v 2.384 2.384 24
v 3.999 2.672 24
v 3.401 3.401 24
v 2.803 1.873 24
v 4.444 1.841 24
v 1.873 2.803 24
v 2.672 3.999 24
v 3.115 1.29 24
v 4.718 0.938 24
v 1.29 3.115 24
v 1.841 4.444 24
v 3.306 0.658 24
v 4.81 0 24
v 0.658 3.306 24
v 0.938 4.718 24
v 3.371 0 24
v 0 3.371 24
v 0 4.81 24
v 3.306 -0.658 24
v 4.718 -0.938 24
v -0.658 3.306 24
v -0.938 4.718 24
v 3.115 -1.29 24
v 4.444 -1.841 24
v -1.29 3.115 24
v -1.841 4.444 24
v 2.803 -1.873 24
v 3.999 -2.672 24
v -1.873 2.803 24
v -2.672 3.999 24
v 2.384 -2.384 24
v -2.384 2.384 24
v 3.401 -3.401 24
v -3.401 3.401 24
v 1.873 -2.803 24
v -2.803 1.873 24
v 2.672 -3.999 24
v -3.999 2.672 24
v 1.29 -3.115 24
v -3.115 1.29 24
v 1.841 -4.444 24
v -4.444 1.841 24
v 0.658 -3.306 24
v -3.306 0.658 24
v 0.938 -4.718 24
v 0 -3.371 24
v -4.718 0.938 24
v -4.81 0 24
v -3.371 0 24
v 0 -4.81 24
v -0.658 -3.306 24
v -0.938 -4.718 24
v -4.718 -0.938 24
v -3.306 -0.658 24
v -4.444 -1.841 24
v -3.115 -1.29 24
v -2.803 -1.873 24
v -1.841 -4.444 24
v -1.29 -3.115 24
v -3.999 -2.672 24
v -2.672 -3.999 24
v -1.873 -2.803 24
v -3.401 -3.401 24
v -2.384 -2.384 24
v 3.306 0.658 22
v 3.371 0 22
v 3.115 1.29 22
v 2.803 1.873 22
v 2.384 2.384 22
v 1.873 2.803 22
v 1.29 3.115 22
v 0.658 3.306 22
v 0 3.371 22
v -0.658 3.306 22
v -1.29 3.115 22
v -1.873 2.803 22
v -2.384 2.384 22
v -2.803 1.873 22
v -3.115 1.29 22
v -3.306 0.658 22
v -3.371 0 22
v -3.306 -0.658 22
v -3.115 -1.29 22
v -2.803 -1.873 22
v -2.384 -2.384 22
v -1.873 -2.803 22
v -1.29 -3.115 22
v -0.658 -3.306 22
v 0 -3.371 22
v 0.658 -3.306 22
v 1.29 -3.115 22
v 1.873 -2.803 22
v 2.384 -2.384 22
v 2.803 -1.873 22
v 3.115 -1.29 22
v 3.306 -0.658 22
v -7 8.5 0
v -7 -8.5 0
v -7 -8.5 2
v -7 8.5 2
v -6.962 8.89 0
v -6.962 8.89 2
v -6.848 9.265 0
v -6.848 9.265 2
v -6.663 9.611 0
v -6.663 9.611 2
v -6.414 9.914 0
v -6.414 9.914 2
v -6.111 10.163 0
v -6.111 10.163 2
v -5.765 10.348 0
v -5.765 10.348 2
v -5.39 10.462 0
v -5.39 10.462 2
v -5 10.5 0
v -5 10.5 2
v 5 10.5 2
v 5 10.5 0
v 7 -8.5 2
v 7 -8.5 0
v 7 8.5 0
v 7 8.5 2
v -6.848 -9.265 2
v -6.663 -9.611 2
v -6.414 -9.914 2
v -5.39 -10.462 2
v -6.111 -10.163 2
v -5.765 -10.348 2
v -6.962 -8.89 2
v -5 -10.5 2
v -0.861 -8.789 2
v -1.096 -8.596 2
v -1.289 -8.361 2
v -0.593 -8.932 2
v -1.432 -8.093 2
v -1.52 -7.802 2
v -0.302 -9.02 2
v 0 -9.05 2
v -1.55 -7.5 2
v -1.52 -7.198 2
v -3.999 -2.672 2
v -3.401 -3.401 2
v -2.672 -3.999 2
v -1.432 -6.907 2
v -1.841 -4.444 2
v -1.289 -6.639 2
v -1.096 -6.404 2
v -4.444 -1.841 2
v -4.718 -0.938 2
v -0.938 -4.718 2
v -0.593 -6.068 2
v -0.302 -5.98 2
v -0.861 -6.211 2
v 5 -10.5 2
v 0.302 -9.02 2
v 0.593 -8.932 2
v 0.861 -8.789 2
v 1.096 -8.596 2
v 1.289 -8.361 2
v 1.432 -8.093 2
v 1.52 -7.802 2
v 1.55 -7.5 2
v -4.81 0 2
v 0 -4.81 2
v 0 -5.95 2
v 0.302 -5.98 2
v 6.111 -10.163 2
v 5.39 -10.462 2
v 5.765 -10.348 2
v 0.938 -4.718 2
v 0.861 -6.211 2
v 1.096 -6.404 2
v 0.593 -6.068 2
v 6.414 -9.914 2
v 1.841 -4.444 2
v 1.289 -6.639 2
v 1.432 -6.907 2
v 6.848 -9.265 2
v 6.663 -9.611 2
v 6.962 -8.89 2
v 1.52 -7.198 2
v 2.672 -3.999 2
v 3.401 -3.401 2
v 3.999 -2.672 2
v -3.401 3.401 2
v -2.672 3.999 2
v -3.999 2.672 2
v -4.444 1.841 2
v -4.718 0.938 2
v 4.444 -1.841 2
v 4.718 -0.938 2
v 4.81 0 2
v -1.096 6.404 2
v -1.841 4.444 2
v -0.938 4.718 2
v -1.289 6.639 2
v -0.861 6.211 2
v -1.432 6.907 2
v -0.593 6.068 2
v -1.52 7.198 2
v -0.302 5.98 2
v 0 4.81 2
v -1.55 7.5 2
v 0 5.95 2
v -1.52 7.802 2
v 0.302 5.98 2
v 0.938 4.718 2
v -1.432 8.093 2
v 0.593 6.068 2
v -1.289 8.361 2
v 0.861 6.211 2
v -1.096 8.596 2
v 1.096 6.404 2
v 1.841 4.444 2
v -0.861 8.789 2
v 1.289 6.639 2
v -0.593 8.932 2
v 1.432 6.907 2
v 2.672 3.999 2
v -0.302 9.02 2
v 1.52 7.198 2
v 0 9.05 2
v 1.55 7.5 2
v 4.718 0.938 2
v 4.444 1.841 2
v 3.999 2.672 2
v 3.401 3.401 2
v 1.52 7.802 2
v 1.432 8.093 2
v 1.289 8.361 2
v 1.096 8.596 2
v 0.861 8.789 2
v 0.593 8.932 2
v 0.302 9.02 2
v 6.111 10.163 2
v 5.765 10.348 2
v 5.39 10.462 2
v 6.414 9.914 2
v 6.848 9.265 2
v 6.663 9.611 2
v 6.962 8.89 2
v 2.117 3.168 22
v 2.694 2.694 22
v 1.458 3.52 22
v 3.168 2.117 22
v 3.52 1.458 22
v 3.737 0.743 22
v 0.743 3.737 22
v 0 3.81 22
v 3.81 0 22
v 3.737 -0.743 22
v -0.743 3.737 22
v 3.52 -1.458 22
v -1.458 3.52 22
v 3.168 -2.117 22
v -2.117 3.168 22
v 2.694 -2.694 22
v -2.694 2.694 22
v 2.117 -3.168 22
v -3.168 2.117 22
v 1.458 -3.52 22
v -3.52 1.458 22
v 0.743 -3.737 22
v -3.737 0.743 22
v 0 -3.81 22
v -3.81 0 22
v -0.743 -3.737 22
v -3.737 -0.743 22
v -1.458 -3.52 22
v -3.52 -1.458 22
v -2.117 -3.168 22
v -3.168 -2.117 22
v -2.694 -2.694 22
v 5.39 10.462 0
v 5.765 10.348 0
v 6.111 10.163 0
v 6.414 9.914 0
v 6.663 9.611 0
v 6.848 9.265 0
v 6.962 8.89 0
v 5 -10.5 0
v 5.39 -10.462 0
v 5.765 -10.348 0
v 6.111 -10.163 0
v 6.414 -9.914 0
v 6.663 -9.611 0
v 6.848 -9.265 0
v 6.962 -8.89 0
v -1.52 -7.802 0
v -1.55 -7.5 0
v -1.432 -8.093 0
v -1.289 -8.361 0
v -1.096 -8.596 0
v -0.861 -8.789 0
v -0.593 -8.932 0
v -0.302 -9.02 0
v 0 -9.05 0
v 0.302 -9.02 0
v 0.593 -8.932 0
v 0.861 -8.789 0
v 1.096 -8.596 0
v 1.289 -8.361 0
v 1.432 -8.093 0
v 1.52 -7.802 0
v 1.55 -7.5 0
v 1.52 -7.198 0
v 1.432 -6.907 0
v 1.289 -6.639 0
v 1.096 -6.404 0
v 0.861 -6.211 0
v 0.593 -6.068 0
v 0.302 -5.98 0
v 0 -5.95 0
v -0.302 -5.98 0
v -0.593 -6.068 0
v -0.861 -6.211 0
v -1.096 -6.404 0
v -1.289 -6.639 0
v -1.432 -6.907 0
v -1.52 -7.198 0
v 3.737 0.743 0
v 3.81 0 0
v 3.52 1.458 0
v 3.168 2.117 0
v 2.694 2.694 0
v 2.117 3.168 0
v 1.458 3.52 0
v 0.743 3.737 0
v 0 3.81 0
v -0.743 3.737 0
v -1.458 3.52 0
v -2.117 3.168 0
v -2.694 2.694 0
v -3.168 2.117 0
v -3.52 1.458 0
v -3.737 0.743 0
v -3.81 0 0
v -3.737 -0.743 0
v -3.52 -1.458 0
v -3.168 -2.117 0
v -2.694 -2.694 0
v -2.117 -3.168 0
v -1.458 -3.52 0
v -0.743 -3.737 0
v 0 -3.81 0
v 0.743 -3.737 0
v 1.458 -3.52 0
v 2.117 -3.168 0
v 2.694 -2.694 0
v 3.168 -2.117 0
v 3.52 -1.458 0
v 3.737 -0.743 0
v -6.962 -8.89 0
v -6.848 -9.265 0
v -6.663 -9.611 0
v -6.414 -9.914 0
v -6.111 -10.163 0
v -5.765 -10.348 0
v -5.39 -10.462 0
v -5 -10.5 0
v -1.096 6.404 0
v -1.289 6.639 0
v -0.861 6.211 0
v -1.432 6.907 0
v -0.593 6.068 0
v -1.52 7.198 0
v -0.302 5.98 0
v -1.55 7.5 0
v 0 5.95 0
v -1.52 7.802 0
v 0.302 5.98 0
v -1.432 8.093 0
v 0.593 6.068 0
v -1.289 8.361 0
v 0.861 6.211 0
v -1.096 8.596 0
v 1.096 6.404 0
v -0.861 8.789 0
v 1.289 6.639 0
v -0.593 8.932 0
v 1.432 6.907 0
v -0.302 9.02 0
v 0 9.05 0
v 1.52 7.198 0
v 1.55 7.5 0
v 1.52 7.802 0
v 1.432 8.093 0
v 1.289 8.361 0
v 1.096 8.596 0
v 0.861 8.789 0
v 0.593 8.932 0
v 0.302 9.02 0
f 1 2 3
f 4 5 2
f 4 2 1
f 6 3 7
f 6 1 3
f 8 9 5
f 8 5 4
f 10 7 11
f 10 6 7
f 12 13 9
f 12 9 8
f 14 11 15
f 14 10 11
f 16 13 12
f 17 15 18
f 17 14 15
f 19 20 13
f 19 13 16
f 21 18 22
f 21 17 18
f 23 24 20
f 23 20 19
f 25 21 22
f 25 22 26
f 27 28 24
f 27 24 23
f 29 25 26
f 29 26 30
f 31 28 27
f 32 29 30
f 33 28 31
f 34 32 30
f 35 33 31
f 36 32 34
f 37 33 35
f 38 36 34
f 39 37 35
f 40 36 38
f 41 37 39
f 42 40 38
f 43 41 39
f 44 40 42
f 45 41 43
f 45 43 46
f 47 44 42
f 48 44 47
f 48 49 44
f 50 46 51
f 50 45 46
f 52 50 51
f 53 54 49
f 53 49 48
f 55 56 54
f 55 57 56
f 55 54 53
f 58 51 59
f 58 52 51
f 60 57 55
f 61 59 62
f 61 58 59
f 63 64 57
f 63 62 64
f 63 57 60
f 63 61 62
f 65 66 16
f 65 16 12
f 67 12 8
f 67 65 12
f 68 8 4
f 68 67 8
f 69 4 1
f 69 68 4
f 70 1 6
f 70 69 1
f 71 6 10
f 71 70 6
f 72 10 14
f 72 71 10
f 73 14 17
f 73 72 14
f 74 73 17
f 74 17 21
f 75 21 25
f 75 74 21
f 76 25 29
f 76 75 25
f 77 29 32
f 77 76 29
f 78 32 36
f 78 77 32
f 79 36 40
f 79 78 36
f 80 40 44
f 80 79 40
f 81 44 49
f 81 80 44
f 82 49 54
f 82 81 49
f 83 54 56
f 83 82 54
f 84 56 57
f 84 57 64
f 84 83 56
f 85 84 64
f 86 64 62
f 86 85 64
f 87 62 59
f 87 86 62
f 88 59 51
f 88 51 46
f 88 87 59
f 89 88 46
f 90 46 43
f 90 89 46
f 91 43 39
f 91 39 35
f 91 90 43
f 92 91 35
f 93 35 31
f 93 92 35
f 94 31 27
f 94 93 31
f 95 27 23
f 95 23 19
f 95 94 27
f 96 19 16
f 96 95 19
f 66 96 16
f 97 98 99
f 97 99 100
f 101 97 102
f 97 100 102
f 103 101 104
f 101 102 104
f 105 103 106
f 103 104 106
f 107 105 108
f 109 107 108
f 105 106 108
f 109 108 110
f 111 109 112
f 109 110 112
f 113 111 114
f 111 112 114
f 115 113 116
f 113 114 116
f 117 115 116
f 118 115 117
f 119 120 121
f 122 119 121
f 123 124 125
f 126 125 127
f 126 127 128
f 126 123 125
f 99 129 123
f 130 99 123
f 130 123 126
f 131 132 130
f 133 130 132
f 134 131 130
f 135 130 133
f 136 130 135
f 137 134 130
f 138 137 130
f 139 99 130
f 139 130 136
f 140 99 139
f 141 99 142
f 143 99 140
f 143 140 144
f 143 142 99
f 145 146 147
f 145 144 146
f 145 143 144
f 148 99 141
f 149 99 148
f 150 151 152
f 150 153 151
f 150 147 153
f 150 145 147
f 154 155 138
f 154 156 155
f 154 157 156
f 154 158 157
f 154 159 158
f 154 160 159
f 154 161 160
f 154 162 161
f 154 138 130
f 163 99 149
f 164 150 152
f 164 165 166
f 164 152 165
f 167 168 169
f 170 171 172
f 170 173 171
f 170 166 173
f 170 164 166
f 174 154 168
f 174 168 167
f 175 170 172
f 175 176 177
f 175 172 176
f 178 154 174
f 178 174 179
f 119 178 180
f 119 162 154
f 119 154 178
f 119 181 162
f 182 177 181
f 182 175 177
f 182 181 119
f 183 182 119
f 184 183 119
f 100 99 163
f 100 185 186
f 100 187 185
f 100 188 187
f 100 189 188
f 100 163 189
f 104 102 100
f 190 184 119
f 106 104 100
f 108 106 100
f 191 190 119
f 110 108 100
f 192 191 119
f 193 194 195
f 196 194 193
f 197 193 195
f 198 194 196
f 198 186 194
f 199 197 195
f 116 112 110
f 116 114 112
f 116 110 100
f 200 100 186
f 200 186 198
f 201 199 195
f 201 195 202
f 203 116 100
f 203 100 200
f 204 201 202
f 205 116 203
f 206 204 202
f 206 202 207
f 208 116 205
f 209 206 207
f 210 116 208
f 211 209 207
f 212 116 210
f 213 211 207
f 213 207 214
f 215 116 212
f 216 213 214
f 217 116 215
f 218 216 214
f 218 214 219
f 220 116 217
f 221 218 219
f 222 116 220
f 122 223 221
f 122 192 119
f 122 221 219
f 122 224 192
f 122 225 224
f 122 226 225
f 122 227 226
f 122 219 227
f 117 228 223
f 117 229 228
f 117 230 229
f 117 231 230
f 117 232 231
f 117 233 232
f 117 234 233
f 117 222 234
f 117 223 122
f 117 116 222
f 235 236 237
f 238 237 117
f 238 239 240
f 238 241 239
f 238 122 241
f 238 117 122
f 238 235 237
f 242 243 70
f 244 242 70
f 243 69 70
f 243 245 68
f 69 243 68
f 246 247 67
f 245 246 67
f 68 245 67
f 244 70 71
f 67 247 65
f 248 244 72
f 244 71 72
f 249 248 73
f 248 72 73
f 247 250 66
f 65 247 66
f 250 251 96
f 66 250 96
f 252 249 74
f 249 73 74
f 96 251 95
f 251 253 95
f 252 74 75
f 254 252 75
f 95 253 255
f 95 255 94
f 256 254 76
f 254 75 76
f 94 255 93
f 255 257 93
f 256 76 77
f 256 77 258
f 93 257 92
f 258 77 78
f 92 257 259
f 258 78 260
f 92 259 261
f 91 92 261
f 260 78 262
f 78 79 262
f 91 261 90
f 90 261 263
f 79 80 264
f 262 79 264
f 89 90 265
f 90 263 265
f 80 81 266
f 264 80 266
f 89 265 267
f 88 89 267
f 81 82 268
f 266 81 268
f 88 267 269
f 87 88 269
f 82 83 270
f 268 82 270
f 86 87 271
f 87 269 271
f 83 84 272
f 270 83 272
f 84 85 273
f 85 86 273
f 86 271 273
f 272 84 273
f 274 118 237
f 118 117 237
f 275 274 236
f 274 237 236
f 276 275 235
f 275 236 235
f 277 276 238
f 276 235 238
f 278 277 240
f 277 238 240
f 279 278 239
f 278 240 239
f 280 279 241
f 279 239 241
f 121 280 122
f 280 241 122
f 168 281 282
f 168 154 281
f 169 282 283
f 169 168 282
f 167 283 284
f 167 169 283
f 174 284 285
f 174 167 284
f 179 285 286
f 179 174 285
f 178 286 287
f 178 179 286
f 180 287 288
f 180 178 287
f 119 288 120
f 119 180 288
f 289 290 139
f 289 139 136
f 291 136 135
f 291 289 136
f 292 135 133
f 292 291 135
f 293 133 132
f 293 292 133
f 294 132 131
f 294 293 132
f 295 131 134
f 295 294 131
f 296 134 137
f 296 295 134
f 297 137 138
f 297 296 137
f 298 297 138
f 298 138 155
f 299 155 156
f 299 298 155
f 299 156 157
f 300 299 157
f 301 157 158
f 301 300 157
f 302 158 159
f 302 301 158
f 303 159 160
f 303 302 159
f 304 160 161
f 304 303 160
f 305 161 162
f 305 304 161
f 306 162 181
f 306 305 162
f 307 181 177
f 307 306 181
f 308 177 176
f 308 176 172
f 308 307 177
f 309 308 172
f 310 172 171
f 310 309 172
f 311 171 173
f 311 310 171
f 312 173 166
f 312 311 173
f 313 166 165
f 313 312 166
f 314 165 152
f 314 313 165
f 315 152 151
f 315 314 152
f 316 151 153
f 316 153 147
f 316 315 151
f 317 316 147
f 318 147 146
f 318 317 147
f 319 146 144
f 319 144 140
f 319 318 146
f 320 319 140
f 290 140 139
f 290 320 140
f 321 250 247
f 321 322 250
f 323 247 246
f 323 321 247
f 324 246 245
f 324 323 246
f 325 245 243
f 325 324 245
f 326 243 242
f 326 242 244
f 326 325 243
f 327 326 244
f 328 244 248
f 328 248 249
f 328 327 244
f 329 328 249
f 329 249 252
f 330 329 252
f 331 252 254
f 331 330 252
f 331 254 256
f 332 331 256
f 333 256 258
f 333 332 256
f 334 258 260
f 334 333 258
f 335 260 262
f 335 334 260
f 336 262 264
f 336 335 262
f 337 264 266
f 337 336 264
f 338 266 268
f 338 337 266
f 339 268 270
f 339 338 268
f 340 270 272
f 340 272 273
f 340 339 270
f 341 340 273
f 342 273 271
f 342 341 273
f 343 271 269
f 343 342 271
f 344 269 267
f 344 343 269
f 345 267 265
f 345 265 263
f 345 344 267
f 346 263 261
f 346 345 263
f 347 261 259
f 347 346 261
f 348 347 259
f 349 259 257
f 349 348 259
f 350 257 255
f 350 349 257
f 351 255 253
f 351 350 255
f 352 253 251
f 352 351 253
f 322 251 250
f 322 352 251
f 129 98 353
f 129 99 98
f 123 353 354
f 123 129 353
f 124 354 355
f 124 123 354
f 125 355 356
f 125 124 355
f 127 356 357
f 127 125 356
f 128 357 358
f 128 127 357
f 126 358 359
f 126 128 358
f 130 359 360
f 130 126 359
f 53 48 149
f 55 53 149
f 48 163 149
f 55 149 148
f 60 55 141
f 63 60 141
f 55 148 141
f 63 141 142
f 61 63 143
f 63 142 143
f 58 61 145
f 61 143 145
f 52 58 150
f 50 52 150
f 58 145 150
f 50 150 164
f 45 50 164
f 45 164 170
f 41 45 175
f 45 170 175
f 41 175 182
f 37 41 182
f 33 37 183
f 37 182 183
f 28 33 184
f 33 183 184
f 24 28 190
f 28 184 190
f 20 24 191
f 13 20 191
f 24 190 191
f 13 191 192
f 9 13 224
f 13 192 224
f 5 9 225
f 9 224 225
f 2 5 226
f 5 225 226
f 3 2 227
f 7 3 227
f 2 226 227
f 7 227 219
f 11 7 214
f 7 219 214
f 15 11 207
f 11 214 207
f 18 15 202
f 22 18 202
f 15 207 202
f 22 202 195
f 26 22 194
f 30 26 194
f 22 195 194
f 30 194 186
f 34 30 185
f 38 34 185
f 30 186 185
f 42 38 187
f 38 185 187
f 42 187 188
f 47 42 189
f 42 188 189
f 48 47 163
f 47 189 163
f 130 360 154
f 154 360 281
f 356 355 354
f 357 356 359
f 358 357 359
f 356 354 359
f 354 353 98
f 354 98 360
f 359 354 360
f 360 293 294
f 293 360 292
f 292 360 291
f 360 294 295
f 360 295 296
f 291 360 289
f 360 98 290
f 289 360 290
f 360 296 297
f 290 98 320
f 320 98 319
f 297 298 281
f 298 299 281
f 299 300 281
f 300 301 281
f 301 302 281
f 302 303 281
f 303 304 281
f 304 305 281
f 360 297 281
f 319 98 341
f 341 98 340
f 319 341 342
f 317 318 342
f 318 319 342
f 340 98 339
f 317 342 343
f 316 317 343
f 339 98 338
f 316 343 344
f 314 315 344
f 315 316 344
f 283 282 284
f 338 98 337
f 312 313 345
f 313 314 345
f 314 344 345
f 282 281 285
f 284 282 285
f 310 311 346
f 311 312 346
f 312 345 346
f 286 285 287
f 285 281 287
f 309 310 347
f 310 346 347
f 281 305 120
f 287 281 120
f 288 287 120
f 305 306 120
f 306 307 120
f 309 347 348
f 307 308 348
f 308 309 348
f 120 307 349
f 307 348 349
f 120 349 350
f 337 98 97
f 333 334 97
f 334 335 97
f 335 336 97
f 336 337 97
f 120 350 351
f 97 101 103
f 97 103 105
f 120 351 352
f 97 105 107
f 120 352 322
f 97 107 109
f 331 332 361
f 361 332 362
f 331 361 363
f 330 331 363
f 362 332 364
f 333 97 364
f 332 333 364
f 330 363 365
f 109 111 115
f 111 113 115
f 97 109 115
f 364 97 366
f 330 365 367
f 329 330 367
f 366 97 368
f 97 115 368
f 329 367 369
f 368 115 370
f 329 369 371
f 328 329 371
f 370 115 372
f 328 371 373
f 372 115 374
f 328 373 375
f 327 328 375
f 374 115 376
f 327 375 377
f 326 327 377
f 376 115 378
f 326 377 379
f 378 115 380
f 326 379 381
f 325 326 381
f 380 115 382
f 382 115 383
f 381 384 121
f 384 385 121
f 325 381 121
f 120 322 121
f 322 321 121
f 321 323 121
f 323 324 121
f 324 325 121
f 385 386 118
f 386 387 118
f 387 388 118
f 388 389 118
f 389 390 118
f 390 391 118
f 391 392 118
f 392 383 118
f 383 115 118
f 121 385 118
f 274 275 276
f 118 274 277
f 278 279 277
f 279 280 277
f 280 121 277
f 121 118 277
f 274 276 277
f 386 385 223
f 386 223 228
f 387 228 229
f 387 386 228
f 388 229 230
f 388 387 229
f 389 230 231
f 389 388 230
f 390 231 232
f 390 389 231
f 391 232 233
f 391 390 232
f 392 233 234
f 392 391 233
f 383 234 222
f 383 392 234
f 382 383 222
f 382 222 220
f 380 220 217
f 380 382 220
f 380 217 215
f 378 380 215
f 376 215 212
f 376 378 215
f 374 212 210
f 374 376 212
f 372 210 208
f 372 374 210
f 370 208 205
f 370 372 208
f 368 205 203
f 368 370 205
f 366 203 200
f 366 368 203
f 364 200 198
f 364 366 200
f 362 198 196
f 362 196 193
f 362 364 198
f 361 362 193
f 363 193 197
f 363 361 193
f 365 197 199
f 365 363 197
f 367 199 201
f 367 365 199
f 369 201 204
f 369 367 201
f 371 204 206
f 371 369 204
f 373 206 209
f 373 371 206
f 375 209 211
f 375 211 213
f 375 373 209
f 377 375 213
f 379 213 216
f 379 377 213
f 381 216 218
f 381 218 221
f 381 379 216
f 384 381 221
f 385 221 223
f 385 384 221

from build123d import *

# Parameters (mm, degrees)
SKETCH1_W           = 14
SKETCH1_H           = 21
SKETCH1_R           = 1.55
SKETCH1_R_2         = 3.81
BOSS_EXTRUDE1_DEPTH = 2
FILLET1_R           = 2
SKETCH3_R           = 4.81
SKETCH3_R_2         = 3.81
BOSS_EXTRUDE2_DEPTH = 20
SKETCH4_R           = 4.81
SKETCH4_R_2         = 3.371204608
BOSS_EXTRUDE3_DEPTH = 2


with BuildPart() as part:
    # Sketch1 → Boss-Extrude1 (new body)
    with BuildSketch(Plane.XY):
        Rectangle(SKETCH1_W, SKETCH1_H)
        with Locations((0, 7.5)):
            Circle(SKETCH1_R, mode=Mode.SUBTRACT)
        with Locations(Location((0, -7.5, 0), (0, 0, 180))):
            Circle(SKETCH1_R, mode=Mode.SUBTRACT)
        Circle(SKETCH1_R_2, mode=Mode.SUBTRACT)
    extrude(amount=BOSS_EXTRUDE1_DEPTH)

    # Fillet1
    fillet1_edges = [part.edges().sort_by_distance(p)[0] for p in [
        (7, -10.5, 1),
        (-7, -10.5, 1),
        (-7, 10.5, 1),
        (7, 10.5, 1),
    ]]
    fillet(fillet1_edges, radius=FILLET1_R)

    # Sketch3 → Boss-Extrude2 (add)
    with BuildSketch(Plane.XY.offset(2)):
        with Locations(Location((0, 0, 0), (0, 0, 180))):
            Circle(SKETCH3_R)
        Circle(SKETCH3_R_2, mode=Mode.SUBTRACT)
    extrude(amount=BOSS_EXTRUDE2_DEPTH)

    # Sketch4 → Boss-Extrude3 (add)
    with BuildSketch(Plane.XY.offset(22)):
        with Locations(Location((0, 0, 0), (0, 0, 180))):
            Circle(SKETCH4_R)
        Circle(SKETCH4_R_2, mode=Mode.SUBTRACT)
    extrude(amount=BOSS_EXTRUDE3_DEPTH)


solid = part.part
